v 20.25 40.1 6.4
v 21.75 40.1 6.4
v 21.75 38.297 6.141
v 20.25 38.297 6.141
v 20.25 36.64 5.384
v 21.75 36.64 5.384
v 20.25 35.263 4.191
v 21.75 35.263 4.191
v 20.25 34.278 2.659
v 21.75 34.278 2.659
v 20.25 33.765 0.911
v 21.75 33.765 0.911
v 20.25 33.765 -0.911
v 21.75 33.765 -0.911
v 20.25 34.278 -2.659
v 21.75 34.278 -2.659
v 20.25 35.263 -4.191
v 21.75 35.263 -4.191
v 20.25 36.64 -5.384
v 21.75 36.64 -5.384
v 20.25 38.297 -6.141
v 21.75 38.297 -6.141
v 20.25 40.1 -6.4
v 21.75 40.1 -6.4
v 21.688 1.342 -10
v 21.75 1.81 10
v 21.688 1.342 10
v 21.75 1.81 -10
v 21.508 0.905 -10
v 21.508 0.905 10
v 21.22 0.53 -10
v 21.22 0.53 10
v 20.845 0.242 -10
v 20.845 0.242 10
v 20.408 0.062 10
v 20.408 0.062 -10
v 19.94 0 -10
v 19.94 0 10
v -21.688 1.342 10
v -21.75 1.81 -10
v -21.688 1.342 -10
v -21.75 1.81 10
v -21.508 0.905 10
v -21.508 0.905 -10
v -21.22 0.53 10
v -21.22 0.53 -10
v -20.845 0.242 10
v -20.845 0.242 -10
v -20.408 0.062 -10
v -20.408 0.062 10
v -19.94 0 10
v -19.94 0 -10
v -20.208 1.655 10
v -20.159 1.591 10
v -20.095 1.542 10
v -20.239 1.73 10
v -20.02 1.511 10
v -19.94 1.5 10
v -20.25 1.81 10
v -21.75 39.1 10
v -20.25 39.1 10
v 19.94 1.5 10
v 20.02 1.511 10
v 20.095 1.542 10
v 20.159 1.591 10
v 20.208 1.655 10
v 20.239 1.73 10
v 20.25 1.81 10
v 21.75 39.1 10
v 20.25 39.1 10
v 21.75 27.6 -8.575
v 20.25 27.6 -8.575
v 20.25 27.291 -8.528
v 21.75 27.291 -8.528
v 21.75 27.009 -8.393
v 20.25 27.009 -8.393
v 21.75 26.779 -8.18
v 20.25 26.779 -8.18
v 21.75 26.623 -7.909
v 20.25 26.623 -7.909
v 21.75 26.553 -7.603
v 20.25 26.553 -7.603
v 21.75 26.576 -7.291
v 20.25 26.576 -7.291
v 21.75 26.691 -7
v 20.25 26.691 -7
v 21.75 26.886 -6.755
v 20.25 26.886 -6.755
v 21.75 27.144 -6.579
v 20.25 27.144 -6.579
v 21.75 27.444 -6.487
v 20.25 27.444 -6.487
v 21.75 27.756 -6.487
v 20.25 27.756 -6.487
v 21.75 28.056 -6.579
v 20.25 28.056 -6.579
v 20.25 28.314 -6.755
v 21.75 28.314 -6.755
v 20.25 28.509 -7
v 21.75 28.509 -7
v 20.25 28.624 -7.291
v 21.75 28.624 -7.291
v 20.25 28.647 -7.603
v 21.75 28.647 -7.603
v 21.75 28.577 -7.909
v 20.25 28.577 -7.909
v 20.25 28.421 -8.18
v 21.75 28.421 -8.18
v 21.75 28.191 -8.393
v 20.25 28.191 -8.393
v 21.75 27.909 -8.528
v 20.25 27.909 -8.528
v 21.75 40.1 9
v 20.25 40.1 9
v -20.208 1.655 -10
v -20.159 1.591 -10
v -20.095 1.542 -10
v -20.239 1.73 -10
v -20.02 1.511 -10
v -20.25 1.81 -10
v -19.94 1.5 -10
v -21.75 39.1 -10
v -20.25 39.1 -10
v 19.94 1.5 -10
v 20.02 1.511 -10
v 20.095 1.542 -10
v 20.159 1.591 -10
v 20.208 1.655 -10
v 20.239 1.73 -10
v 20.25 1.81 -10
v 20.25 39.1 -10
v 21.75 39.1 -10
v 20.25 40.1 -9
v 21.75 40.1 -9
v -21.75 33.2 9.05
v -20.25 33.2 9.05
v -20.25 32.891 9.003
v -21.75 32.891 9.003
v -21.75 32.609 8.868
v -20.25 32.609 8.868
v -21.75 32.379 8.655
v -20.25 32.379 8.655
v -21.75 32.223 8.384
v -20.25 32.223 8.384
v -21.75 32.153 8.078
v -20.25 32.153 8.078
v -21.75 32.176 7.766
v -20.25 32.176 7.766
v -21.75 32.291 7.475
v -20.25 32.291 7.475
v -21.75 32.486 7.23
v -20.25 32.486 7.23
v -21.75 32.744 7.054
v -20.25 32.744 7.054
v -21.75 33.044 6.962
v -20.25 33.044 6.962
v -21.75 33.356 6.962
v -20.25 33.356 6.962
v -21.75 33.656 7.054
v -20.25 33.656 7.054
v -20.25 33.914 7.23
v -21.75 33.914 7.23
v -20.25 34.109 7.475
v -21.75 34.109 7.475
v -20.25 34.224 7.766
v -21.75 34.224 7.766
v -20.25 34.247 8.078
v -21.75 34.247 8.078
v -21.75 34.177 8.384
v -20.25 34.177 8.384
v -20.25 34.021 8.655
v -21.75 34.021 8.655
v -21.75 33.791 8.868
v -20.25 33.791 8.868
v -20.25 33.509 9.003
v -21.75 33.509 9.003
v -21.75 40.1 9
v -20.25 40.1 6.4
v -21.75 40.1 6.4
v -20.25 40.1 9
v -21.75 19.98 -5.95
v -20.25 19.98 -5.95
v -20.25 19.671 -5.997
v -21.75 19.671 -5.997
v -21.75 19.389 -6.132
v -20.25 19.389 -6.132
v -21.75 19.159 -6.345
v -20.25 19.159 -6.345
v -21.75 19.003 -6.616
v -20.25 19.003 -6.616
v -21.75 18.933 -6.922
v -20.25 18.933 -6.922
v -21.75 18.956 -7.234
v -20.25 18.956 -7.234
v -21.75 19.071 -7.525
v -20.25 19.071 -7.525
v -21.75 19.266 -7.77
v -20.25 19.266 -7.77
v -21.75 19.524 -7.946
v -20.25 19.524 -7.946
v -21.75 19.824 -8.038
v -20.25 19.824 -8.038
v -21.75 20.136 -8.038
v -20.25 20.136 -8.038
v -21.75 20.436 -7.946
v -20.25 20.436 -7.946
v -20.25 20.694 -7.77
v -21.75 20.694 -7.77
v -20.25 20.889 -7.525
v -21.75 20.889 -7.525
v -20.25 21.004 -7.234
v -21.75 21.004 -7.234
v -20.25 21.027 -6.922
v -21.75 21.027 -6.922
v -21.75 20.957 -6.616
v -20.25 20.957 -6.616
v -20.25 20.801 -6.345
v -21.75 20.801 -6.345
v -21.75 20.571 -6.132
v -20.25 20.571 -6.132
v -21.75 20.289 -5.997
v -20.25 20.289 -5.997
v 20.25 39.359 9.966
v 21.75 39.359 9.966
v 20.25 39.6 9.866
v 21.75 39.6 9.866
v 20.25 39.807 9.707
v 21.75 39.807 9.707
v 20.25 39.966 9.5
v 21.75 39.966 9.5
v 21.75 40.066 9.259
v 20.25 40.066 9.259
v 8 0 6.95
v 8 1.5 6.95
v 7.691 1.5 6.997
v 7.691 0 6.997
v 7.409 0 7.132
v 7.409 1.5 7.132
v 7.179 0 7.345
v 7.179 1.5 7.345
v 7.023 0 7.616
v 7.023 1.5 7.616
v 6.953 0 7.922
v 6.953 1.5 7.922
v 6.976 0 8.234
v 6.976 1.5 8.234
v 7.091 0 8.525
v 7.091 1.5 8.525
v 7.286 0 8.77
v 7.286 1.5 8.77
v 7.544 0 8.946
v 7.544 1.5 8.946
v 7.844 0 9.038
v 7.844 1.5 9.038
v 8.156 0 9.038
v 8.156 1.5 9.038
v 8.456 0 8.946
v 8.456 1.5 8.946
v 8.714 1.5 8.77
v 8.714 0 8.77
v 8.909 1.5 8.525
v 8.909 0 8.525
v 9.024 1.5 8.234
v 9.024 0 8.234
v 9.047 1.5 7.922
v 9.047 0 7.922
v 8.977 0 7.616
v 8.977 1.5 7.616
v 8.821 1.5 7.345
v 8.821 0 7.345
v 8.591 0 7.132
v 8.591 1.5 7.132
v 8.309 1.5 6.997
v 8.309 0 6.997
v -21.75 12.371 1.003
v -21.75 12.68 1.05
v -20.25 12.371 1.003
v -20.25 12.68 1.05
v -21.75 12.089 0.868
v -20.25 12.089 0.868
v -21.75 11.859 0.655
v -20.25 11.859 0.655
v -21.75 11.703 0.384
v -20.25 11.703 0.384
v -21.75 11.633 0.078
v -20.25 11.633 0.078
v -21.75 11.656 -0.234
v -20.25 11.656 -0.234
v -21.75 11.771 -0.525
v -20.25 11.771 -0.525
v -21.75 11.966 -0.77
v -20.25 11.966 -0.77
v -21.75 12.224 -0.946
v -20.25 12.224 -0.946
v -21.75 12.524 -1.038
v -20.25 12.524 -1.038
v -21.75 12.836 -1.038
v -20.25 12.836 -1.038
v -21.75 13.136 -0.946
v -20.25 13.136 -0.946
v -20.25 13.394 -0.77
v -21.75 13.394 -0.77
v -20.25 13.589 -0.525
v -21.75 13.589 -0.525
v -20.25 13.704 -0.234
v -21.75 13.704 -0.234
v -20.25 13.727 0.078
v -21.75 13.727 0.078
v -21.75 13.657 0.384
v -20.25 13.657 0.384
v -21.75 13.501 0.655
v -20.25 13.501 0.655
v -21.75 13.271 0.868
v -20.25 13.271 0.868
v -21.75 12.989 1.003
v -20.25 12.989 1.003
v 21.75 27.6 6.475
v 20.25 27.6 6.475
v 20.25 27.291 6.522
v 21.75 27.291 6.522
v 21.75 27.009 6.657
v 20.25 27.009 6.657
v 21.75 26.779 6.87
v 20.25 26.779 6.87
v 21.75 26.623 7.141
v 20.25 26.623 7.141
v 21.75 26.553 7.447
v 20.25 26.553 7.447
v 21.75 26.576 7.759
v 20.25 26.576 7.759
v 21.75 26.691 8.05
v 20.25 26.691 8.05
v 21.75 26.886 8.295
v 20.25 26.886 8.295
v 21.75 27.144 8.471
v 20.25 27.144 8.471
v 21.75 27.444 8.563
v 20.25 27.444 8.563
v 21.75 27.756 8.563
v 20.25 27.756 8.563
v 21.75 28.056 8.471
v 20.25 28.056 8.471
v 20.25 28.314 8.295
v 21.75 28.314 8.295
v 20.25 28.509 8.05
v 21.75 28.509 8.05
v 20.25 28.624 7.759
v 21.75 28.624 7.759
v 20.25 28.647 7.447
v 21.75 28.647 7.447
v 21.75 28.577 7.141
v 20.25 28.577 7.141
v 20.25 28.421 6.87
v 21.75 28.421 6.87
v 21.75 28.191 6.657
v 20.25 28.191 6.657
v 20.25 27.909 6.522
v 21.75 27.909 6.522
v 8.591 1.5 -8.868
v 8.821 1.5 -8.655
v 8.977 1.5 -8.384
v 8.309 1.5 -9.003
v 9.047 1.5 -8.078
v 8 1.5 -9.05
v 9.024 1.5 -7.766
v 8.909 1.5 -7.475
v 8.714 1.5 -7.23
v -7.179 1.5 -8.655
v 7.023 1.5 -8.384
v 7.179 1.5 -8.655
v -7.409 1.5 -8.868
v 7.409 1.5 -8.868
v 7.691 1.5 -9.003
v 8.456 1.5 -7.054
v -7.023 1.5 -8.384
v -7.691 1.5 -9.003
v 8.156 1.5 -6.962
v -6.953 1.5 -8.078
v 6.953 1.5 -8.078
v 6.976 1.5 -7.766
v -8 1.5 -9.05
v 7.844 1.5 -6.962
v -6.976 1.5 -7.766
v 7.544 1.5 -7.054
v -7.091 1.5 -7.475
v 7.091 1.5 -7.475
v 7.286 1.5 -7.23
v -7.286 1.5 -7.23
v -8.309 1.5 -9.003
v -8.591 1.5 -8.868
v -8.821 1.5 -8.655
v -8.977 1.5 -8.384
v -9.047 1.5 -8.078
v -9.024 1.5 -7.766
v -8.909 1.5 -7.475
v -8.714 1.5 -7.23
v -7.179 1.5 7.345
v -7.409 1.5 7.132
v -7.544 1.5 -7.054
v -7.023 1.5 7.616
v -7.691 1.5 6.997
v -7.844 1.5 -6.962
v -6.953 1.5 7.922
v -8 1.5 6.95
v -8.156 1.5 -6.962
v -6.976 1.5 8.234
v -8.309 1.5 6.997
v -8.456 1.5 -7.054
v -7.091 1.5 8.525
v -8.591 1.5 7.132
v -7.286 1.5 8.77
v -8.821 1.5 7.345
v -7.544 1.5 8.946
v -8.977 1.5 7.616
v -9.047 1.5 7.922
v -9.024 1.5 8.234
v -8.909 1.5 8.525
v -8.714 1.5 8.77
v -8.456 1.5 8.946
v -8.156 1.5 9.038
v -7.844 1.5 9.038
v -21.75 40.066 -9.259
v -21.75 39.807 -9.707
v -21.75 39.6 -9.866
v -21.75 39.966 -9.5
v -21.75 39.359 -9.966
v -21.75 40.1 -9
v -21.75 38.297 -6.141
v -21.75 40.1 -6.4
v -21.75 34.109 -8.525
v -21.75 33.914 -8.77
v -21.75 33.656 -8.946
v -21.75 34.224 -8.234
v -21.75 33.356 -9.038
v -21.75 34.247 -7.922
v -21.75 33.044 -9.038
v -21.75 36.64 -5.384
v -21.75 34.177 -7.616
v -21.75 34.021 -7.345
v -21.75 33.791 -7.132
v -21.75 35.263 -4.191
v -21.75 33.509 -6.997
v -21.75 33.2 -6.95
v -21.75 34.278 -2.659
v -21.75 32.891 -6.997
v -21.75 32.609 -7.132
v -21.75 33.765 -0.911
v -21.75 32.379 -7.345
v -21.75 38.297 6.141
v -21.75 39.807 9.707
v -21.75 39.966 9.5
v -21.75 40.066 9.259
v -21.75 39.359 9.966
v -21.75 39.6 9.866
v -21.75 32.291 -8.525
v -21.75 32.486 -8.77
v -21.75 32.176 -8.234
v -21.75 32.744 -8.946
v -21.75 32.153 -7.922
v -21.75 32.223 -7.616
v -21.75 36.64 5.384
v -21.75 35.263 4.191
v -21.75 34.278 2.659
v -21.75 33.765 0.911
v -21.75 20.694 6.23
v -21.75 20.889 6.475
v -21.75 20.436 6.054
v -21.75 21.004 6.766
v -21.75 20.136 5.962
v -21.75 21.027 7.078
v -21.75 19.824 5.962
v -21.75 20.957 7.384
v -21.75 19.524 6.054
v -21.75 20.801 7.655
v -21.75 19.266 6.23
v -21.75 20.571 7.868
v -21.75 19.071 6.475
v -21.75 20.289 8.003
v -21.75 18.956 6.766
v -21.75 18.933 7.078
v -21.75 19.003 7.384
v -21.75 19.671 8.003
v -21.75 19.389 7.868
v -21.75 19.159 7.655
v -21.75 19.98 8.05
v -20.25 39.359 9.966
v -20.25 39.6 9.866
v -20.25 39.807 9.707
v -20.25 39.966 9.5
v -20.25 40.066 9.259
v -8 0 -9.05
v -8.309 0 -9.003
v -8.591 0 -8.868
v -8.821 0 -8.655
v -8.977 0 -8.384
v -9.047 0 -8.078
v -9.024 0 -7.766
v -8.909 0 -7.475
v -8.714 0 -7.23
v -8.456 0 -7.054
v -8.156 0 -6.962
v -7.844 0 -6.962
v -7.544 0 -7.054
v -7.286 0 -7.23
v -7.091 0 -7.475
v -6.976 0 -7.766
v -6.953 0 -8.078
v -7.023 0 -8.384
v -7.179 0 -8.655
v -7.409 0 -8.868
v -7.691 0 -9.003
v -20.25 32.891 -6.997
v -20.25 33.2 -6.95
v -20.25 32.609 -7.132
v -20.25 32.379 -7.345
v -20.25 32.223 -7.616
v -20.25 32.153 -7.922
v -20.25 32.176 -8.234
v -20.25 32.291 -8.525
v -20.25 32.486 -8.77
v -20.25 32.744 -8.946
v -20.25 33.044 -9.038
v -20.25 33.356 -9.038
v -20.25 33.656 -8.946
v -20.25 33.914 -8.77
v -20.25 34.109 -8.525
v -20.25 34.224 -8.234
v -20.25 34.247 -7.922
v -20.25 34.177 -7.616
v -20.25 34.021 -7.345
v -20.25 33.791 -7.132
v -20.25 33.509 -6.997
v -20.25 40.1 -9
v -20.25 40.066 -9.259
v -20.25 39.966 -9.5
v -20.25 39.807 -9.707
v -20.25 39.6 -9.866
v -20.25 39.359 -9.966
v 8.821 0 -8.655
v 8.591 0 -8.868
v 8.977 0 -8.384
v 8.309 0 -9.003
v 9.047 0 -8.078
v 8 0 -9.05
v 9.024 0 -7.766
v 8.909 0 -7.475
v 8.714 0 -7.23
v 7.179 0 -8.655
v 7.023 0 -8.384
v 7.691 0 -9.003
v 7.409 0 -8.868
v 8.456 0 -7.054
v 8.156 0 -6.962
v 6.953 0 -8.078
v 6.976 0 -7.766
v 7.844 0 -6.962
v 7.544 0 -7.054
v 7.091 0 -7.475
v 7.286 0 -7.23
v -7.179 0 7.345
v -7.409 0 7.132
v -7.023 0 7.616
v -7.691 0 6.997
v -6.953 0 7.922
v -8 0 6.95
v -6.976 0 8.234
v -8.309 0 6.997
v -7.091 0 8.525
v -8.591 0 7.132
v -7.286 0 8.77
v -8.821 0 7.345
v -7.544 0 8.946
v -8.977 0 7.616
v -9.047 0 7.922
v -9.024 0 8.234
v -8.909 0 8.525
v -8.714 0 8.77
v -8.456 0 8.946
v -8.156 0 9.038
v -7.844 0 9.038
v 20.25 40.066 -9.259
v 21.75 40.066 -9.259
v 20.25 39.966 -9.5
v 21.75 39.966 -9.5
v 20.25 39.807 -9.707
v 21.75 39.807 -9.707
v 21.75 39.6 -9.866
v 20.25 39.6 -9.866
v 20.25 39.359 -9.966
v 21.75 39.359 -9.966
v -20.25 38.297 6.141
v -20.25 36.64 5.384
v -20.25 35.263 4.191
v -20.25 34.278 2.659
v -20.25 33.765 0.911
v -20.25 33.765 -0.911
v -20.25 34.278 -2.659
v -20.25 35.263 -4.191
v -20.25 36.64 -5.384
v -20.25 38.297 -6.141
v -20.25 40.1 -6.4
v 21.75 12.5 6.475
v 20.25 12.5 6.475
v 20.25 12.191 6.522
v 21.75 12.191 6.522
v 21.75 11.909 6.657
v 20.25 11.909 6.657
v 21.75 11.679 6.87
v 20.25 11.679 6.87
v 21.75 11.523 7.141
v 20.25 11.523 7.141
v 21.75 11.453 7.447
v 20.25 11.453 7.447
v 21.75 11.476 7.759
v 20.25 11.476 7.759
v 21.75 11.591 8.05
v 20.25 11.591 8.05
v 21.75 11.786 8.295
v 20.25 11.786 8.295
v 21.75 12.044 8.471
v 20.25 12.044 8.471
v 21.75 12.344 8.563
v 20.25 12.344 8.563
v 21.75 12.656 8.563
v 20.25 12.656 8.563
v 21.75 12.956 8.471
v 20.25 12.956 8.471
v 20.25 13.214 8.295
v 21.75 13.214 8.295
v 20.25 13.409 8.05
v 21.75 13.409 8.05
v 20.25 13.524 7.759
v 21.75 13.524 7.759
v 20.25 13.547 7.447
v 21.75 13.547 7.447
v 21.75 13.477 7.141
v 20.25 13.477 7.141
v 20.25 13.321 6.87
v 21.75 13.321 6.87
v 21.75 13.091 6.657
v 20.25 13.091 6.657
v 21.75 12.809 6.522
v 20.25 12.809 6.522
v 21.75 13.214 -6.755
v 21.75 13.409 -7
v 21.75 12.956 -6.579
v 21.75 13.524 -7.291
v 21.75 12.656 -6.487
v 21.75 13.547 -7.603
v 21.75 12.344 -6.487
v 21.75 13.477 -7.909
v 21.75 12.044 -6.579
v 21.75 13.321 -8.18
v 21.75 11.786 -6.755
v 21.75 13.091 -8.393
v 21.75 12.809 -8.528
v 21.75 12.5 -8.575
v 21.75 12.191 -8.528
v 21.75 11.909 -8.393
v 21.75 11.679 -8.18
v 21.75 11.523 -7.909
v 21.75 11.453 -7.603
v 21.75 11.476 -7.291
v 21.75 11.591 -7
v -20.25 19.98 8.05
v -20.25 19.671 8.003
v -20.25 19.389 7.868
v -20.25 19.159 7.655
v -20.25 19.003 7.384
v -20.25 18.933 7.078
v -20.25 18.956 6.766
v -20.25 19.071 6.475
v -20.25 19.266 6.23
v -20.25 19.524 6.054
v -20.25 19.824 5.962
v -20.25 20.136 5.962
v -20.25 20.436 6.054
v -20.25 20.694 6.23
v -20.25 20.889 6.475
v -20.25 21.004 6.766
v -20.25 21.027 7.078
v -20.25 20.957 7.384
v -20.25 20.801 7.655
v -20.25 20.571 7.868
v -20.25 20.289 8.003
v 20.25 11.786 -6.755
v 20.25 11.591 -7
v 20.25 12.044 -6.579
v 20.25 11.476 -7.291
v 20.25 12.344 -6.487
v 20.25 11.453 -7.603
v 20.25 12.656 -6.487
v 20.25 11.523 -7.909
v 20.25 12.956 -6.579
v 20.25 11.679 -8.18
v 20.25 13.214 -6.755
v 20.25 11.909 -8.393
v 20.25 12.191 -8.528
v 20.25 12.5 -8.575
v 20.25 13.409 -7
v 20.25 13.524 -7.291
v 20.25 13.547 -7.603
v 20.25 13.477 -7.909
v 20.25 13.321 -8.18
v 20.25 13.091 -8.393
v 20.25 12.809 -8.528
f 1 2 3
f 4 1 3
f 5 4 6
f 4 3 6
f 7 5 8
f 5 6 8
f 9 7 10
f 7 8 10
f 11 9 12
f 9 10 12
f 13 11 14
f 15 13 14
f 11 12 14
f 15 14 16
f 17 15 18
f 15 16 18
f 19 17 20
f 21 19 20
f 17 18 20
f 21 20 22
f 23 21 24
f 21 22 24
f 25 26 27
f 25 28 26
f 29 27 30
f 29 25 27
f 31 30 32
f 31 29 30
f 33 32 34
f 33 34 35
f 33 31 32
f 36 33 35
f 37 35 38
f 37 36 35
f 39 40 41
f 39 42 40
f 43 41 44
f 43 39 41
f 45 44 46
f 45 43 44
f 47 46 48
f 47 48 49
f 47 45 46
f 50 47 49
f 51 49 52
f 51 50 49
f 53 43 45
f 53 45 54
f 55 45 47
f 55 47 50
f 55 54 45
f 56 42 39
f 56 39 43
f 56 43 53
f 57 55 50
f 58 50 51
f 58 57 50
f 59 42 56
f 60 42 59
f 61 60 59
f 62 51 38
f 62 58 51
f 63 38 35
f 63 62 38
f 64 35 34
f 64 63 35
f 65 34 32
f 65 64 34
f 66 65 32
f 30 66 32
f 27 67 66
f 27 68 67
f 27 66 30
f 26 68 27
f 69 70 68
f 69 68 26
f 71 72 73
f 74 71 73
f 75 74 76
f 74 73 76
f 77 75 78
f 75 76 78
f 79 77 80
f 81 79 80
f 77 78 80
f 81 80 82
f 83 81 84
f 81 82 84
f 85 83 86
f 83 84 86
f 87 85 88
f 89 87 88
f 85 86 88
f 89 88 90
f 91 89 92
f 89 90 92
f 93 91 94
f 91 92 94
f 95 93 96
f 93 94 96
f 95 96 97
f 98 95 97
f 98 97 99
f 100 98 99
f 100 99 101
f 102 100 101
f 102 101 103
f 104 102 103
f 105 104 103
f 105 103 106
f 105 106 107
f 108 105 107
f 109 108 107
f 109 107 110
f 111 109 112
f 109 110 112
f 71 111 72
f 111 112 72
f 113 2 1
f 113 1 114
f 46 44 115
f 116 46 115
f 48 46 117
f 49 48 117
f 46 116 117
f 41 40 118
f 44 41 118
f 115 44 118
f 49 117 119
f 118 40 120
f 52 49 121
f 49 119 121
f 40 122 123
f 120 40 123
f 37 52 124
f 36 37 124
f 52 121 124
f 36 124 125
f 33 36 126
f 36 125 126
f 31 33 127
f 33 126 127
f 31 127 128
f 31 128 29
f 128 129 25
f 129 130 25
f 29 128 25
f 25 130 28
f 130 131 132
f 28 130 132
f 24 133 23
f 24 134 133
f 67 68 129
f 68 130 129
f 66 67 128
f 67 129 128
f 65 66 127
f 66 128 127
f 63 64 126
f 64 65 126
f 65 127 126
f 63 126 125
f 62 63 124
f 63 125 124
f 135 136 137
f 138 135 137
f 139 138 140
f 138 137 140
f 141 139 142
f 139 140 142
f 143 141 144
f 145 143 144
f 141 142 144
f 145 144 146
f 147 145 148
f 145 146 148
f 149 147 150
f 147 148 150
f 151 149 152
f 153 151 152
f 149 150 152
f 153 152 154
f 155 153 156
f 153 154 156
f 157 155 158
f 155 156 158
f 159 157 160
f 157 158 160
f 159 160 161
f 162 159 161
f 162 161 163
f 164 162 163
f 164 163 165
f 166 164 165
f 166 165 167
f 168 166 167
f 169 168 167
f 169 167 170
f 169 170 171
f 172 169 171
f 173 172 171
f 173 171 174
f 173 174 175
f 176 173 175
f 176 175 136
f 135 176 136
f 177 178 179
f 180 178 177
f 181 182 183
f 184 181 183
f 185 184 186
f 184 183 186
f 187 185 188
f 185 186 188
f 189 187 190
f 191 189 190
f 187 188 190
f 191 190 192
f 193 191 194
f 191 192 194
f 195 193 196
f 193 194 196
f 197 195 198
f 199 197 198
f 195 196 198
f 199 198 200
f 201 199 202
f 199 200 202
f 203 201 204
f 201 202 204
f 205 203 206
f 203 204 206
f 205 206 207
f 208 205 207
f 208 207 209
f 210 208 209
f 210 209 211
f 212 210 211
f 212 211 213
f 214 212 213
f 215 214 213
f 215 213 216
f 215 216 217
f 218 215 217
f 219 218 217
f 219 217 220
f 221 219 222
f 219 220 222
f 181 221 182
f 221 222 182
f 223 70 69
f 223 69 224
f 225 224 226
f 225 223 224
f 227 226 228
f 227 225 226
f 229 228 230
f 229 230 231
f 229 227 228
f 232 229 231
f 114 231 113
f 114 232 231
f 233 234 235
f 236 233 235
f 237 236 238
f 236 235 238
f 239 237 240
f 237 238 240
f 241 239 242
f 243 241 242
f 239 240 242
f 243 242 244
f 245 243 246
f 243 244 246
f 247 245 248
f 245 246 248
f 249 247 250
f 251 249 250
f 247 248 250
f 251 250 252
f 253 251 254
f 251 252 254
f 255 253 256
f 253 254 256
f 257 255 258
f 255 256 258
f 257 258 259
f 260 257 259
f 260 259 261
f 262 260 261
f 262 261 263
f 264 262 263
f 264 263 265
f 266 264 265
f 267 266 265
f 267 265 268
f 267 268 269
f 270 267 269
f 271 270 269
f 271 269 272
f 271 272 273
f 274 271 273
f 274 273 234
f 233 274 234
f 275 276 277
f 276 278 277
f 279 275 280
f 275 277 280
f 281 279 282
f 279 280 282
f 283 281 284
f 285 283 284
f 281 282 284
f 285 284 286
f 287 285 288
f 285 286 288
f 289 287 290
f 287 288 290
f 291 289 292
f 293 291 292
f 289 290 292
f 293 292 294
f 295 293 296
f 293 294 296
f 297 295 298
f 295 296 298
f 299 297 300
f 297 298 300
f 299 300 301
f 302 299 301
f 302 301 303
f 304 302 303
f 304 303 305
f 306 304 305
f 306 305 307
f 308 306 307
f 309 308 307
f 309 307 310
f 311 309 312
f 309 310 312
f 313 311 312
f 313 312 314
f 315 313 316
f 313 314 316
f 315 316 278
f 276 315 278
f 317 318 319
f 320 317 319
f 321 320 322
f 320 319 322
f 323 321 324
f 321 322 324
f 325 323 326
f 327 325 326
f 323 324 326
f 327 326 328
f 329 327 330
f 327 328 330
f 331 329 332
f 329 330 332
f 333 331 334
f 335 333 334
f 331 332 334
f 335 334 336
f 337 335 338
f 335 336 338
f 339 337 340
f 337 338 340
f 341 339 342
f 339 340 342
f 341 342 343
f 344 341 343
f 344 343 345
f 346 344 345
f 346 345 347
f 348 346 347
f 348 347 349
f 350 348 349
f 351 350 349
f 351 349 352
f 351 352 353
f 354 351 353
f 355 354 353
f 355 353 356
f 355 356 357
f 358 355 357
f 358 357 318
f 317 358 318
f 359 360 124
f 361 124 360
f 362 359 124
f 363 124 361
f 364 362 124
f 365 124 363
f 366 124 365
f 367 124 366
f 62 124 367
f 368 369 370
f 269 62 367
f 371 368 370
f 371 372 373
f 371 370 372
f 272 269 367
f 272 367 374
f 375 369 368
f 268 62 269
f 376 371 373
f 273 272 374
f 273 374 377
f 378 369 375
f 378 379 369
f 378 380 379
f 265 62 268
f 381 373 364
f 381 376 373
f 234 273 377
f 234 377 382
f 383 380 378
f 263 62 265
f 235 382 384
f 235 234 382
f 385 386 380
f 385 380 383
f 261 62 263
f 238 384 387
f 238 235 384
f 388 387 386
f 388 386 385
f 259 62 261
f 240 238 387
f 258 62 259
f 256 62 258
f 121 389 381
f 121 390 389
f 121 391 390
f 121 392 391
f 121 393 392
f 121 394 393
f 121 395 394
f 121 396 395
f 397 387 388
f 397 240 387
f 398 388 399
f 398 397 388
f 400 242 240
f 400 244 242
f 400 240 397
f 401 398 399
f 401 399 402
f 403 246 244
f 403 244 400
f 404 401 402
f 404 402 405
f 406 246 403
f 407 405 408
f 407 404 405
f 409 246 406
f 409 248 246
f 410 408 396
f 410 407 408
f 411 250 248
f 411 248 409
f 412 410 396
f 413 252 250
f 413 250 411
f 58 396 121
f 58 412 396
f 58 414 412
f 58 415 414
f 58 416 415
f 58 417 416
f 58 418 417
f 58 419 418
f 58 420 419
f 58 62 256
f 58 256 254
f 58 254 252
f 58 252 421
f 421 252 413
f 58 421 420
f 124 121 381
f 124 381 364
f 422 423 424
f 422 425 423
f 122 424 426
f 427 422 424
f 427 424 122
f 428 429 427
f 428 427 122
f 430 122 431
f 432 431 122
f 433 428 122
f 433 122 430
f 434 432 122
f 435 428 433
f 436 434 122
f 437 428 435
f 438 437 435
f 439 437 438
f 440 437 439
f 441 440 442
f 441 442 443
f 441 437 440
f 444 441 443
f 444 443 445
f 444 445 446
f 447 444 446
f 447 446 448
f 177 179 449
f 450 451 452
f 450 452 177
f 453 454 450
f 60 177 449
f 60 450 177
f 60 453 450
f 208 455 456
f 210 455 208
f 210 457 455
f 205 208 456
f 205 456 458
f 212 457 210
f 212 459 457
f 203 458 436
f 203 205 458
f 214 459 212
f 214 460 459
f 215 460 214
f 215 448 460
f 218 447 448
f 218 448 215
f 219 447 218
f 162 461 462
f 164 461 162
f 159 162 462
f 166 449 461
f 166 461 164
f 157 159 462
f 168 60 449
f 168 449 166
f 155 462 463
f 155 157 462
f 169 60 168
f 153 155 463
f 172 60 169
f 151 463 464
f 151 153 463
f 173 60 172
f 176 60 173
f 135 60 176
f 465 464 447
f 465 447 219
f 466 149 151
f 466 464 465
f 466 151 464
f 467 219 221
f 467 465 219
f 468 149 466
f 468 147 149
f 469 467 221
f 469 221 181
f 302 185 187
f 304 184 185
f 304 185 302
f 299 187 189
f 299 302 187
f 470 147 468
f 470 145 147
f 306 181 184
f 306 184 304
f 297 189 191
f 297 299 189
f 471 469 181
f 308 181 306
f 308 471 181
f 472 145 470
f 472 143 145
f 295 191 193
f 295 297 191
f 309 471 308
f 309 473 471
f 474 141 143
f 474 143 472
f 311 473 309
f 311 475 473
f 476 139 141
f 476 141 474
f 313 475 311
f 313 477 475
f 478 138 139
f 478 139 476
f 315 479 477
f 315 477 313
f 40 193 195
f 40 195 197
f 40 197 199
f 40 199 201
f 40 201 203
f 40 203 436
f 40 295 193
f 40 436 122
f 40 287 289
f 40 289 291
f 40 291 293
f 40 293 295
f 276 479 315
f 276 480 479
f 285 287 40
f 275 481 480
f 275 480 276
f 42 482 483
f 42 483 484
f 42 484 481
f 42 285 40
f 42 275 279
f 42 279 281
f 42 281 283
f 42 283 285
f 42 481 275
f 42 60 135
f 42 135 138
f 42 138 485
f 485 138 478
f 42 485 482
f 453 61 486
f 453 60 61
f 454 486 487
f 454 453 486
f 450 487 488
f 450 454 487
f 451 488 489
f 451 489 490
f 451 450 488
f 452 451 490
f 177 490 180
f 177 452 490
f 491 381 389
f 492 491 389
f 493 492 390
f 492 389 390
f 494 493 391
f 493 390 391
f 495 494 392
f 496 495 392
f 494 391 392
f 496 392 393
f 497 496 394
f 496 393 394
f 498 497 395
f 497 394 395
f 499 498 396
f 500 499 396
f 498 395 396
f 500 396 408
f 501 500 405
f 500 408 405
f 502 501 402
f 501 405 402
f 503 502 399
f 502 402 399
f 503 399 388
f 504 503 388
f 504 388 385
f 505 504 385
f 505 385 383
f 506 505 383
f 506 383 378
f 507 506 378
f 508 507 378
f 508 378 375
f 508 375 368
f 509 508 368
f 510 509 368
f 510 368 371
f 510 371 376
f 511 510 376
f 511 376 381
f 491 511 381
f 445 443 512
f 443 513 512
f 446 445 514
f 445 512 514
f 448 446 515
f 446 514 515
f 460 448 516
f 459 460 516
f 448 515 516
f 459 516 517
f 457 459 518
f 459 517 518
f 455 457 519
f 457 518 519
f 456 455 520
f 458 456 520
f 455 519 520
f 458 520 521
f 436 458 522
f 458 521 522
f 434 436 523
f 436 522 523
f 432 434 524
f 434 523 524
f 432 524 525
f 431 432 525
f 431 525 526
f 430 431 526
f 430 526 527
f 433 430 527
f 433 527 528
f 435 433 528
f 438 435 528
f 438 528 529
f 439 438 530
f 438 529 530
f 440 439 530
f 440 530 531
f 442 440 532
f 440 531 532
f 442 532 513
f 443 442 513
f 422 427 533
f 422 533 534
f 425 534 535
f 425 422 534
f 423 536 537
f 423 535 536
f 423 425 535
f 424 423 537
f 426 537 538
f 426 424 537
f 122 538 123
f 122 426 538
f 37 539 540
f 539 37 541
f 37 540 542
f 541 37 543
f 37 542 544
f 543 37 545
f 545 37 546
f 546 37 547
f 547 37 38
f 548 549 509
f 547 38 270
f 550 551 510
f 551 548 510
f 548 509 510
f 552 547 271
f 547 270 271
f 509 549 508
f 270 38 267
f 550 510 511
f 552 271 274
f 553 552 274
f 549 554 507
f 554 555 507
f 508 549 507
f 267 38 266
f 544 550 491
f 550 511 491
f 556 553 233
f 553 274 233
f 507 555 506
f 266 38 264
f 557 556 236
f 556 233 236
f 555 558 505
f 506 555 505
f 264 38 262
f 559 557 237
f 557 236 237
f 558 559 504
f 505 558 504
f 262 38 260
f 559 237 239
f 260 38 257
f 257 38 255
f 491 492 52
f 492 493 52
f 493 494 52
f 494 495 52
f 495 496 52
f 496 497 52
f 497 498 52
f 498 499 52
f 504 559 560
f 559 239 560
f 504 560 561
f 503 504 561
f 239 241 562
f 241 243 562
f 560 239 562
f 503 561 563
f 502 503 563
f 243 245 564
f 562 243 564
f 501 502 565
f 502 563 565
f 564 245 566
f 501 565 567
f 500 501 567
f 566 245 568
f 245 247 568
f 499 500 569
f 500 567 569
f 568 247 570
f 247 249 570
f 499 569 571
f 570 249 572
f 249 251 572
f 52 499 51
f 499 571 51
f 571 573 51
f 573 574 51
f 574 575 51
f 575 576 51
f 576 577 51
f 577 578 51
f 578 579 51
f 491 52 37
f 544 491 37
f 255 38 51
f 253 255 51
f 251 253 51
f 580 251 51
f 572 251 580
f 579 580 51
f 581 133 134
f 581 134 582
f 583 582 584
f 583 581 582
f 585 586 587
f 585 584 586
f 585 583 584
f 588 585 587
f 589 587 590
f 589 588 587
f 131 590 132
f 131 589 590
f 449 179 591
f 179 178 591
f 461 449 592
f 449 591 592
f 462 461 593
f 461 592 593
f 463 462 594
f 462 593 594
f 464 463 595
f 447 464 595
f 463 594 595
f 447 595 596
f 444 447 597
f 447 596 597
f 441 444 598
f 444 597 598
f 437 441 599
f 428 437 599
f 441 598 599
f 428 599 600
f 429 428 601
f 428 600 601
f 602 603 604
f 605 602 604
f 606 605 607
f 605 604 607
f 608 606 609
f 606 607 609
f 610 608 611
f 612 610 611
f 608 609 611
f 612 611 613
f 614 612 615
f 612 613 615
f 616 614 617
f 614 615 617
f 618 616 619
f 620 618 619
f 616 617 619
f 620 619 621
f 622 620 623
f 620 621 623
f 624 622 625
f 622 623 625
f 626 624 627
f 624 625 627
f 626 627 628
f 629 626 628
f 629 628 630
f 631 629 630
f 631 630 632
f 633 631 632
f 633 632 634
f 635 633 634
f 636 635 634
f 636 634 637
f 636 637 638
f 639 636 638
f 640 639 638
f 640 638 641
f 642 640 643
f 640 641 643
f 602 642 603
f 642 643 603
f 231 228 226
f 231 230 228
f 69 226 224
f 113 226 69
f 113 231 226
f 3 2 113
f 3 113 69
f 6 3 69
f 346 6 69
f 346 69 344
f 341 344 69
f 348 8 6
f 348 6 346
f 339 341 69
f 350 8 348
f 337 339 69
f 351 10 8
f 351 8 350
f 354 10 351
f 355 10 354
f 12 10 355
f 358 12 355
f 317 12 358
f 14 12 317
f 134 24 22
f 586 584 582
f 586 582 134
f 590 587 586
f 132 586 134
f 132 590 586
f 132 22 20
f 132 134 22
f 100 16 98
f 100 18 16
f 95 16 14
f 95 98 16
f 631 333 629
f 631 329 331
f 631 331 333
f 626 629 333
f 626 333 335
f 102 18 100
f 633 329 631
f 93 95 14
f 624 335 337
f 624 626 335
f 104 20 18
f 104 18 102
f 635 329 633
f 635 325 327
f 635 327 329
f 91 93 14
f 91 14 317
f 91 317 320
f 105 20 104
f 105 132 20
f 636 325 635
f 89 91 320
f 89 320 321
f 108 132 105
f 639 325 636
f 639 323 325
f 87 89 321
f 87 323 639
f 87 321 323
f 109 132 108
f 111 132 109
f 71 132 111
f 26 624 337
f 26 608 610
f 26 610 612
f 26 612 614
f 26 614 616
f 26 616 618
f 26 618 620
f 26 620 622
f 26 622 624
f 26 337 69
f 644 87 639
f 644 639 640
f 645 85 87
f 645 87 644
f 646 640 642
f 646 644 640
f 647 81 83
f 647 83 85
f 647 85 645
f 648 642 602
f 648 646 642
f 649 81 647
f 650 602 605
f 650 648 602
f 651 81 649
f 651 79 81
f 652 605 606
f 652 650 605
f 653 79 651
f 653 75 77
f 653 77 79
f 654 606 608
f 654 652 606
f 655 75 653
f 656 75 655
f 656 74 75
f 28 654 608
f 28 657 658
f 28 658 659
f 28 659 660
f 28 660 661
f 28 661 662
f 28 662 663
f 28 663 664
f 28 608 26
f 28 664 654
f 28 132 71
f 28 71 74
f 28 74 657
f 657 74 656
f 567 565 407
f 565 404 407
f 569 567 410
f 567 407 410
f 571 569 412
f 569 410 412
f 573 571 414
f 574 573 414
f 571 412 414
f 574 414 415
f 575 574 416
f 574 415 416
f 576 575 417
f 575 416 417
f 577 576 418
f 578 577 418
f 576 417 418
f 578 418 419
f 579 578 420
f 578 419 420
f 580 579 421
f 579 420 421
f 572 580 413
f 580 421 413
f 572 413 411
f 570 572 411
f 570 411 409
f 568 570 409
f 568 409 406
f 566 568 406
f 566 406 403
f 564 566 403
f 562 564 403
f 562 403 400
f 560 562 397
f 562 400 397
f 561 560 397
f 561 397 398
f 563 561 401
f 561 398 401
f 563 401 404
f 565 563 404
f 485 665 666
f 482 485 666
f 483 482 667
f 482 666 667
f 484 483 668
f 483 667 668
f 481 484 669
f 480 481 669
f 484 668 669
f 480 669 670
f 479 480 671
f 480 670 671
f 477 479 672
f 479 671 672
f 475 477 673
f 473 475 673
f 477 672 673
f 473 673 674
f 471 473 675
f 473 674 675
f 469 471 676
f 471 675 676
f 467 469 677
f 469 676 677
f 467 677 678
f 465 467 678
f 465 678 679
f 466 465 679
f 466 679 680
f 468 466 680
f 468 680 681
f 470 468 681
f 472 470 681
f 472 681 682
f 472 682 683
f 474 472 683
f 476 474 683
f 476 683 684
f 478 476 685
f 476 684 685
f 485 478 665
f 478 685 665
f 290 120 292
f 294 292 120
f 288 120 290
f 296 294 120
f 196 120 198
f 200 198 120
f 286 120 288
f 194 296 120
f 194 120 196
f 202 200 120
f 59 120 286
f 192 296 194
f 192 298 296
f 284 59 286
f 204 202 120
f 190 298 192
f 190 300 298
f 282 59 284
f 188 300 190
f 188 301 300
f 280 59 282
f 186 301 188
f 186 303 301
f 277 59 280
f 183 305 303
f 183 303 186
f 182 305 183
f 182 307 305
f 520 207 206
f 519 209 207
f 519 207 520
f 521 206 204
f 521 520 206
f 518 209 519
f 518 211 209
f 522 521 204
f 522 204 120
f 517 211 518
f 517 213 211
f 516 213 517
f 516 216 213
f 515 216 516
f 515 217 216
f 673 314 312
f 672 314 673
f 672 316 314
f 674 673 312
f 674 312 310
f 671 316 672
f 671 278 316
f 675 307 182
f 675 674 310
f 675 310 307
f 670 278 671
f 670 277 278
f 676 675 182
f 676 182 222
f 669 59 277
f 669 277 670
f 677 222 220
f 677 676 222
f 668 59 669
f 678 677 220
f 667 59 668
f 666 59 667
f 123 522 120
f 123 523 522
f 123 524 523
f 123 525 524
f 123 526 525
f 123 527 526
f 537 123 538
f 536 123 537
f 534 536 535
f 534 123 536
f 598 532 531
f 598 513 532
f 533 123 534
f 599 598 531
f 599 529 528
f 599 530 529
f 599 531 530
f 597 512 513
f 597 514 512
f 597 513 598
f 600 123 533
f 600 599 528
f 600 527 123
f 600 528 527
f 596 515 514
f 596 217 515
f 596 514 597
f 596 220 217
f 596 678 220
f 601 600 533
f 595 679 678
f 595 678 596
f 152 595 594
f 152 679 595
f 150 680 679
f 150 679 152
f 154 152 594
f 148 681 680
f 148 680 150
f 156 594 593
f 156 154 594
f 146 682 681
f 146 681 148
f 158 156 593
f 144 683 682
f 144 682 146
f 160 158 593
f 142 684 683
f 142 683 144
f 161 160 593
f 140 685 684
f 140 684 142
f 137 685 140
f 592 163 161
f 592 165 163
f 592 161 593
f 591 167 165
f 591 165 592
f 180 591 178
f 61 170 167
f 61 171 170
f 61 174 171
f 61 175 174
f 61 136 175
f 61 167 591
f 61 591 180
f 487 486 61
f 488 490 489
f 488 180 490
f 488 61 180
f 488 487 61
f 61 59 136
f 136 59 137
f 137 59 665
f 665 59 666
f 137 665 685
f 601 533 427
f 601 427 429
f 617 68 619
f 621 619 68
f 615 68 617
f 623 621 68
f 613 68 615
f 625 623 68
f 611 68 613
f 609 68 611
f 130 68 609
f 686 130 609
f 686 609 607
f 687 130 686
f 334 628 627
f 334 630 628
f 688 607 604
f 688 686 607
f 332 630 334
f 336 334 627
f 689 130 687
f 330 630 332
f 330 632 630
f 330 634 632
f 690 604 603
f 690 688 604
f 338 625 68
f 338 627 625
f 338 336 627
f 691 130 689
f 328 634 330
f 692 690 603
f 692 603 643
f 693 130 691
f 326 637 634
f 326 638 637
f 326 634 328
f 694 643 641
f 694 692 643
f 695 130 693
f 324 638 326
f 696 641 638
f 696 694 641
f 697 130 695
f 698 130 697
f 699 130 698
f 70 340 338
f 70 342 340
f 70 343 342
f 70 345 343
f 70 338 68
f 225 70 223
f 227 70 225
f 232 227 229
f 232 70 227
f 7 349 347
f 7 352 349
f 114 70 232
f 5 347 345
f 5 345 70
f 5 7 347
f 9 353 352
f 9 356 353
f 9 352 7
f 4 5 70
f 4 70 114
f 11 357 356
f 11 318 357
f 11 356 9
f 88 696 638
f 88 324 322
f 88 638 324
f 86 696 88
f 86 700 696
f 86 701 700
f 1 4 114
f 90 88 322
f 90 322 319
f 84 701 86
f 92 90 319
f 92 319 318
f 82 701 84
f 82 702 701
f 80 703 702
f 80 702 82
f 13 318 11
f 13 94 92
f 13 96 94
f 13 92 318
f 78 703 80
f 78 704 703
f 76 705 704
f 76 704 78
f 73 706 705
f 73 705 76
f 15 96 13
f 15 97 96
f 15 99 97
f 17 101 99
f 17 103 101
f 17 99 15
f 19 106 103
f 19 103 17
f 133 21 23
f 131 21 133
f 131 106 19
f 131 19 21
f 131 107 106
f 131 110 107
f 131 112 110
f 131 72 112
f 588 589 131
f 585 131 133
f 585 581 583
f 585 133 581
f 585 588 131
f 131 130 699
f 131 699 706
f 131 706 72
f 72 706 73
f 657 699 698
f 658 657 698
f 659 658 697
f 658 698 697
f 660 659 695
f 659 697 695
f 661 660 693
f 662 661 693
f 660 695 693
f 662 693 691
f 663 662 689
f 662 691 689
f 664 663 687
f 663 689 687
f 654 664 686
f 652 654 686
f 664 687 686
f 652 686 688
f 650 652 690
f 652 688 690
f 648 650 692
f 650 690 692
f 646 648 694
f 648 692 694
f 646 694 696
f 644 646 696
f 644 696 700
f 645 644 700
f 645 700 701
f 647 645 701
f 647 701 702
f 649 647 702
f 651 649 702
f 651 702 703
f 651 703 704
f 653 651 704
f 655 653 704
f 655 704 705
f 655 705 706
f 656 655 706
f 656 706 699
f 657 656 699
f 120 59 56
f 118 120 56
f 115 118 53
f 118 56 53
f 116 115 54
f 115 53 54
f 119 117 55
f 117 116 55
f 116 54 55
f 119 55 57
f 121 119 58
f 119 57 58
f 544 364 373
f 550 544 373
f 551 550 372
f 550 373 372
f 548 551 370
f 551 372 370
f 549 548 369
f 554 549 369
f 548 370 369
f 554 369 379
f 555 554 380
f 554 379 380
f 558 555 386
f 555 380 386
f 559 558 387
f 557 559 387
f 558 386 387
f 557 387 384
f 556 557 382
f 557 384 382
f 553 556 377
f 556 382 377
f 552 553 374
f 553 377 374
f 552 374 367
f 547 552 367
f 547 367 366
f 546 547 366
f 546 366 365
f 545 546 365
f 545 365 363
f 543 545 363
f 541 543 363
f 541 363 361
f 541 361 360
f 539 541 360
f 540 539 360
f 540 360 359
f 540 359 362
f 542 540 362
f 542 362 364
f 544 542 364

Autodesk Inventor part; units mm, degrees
ref_plane "YZ Plane" through (0, 0, 0) normal (1, 0, 0) x (0, 1, 0)
ref_plane "XZ Plane" through (0, 0, 0) normal (0, 1, 0) x (-1, 0, 0)
ref_plane "XY Plane" through (0, 0, 0) normal (0, 0, 1) x (1, 0, 0)
sketch "Sketch1" plane through (0, 0, 0) normal (0, 1, 0) x (-1, 0, 0)
  line L0 (20.25, -10) -> (-20.25, -10)
  line L1 (-20.25, -10) -> (-20.25, 10)
  line L2 (-20.25, 10) -> (20.25, 10)
  line L3 (20.25, 10) -> (20.25, -10)
  point P0 (0, 0)
  dimension "d0" = 40.5
  dimension "d1" = 20
  dimension "d2" = 10
  dimension "d3" = 20.25
extrude "Plate1" add sketch "Sketch1" along normal blind 1.5
sketch "Sketch2" plane through (21.75, 0, -10) normal (-1, 0, 0) x (0, -1, 0)
  line L0 (0, 20) -> (0, 0)
  line L1 (0, 0) -> (-50, 0)
  line L2 (-50, 0) -> (-50, 20)
  line L3 (-50, 20) -> (0, 20)
edge flange "Flange1" height 50 angle 90 thickness 1.5 bend radius 0.31 thickness toward (-1, 0, 0) relief tear relief width 1.5 relief depth 0.75 edges at (20.25, 1.5, 0) wall of the first edge with corners at (21.75, 0, 10) (21.75, 0, -10) (21.75, 50, -10) (21.75, 50, 10)
bend "Bend1"
corner "Corner1"
sketch "Sketch3" plane through (-21.75, 0, 10) normal (1, 0, 0) x (0, 1, 0)
  line L0 (0, -20) -> (0, 0)
  line L1 (0, 0) -> (50, 0)
  line L2 (50, 0) -> (50, -20)
  line L3 (50, -20) -> (0, -20)
edge flange "Flange2" height 50 angle 90 thickness 1.5 bend radius 0.31 thickness toward (1, 0, 0) relief tear relief width 1.5 relief depth 0.75 edges at (-20.25, 1.5, 0) wall of the first edge with corners at (-21.75, 0, -10) (-21.75, 0, 10) (-21.75, 50, 10) (-21.75, 50, -10)
bend "Bend2"
corner "Corner2"
sketch "Sketch4" plane through (21.75, 50, 10) normal (1, 0, 0) x (0, 0, -1)
  circle A0 centre (10, -9.9) radius 6.4
  line L0 (0, 0) -> (20, 0) projected
  line L1 (20, 0) -> (20, -48.19) projected
  point P0 (10, -50)
  dimension "d25" = 9.9
  dimension "d26" = 12.8
  dimension "d27" = 10
extrude "Extrusion1" cut sketch "Sketch4" against normal blind 50
sketch "Sketch5" plane through (21.75, 50, 10) normal (1, 0, 0) x (0, 0, -1)
  circle A0 centre (10, -9.9) radius 6.4 projected
  line L0 (0, 0) -> (20, 0) projected
  line L1 (-4, 0) -> (24, 0)
  line L2 (24, 0) -> (24, -9.9)
  line L3 (24, -9.9) -> (-4, -9.9)
  line L4 (-4, -9.9) -> (-4, 0)
  line L5 (0, -48.19) -> (0, 0) projected
  point P0 (10, -50)
  dimension "d30" = 9.9
  dimension "d31" = 28
  dimension "d32" = 4
extrude "Extrusion2" cut sketch "Sketch5" against normal blind 50 contours L3 A0 | A0 L3 L5 L0 L1 L2 | L3 L4 L1 L5 picked at (9.2435, -7.9053)
fillet "Fillet1" radius 1 4 edges at (-21, 40.1, 10) (-21, 40.1, -10) (21, 40.1, -10) (21, 40.1, 10)
sketch "Sketch6" plane through (-21.75, 1.81, -10) normal (-1, 0, 0) x (0, 0, 1)
  circle A0 centre (18, 31.39) radius 0.7835 projected
  circle A1 centre (2, 31.39) radius 0.7835 projected
  circle A2 centre (3, 18.17) radius 0.7835 projected
  circle A3 centre (17, 18.17) radius 0.7835 projected
  circle A4 centre (10, 10.87) radius 0.7835 projected
  point P0 (10, -1.81)
hole "Hole1" at (-21.75, 33.2, -8) at (-21.75, 19.98, -7) at (-21.75, 12.68, 0) at (-21.75, 33.2, 8) at (-21.75, 19.98, 7) direction (1, 0, 0) diameter 2.1 depth 1.5
sketch "Sketch7" plane through (21.75, 1.81, 10) normal (1, 0, 0) x (0, 0, -1)
  circle A0 centre (17.525, 25.79) radius 0.7835 projected
  circle A1 centre (2.475, 25.79) radius 0.7835 projected
  circle A2 centre (17.525, 10.69) radius 0.7835 projected
  circle A3 centre (2.475, 10.69) radius 0.7835 projected
  point P0 (10, -1.81)
hole "Hole2" at (21.75, 27.6, 7.525) at (21.75, 27.6, -7.525) at (21.75, 12.5, -7.525) at (21.75, 12.5, 7.525) direction (-1, 0, 0) diameter 2.1 depth 1.5
sketch "Sketch8" plane through (0, 0, 0) normal (0, -1, 0) x (1, 0, 0)
  circle A0 centre (8, -8) radius 1.05 projected
  circle A1 centre (-8, -8) radius 1.05 projected
  circle A2 centre (8, 8) radius 1.05 projected
  circle A3 centre (-8, 8) radius 1.05 projected
  point P0 (0, 0)
hole "Hole3" at (8, 0, -8) at (-8, 0, -8) at (-8, 0, 8) at (8, 0, 8) direction (0, 1, 0) diameter 2.1 depth 1.5
equation "\"d41\" = Thickness"
equation "\"d48\" = Thickness"
equation "\"d55\" = Thickness"
equation "\"d4\" = Thickness"
equation "\"d5\" = BendReliefWidth"
equation "\"d6\" = BendReliefDepth"
equation "\"d7\" = MinimumRemnant"
equation "\"d8\" = TransitionRadius"
equation "\"d11\" = BendRadius"
equation "\"d12\" = CornerReliefSize"
equation "\"d13\" = GapSize"
equation "\"d14\" = JacobiRadiusSize"
equation "\"d15\" = BendReliefWidth"
equation "\"d16\" = BendReliefDepth"
equation "\"d17\" = MinimumRemnant"
equation "\"d18\" = TransitionRadius"
equation "\"d21\" = BendRadius"
equation "\"d22\" = CornerReliefSize"
equation "\"d23\" = GapSize"
equation "\"d24\" = JacobiRadiusSize"
equation "\"BendReliefWidth\" = Thickness"
equation "\"BendReliefDepth\" = 0.5 * Thickness"
equation "\"CornerReliefSize\" = 4 * Thickness"
equation "\"MinimumRemnant\" = 2 * Thickness"
equation "\"TransitionRadius\" = BendRadius"
equation "\"JacobiRadiusSize\" = BendRadius"
equation "\"GapSize\" = Thickness"
equation "\"Thickness\" = 1.5"
equation "\"BendRadius\" = 0.31"
properties part number "axis_10_top_frame" material "Aluminum 6061-AHC"
